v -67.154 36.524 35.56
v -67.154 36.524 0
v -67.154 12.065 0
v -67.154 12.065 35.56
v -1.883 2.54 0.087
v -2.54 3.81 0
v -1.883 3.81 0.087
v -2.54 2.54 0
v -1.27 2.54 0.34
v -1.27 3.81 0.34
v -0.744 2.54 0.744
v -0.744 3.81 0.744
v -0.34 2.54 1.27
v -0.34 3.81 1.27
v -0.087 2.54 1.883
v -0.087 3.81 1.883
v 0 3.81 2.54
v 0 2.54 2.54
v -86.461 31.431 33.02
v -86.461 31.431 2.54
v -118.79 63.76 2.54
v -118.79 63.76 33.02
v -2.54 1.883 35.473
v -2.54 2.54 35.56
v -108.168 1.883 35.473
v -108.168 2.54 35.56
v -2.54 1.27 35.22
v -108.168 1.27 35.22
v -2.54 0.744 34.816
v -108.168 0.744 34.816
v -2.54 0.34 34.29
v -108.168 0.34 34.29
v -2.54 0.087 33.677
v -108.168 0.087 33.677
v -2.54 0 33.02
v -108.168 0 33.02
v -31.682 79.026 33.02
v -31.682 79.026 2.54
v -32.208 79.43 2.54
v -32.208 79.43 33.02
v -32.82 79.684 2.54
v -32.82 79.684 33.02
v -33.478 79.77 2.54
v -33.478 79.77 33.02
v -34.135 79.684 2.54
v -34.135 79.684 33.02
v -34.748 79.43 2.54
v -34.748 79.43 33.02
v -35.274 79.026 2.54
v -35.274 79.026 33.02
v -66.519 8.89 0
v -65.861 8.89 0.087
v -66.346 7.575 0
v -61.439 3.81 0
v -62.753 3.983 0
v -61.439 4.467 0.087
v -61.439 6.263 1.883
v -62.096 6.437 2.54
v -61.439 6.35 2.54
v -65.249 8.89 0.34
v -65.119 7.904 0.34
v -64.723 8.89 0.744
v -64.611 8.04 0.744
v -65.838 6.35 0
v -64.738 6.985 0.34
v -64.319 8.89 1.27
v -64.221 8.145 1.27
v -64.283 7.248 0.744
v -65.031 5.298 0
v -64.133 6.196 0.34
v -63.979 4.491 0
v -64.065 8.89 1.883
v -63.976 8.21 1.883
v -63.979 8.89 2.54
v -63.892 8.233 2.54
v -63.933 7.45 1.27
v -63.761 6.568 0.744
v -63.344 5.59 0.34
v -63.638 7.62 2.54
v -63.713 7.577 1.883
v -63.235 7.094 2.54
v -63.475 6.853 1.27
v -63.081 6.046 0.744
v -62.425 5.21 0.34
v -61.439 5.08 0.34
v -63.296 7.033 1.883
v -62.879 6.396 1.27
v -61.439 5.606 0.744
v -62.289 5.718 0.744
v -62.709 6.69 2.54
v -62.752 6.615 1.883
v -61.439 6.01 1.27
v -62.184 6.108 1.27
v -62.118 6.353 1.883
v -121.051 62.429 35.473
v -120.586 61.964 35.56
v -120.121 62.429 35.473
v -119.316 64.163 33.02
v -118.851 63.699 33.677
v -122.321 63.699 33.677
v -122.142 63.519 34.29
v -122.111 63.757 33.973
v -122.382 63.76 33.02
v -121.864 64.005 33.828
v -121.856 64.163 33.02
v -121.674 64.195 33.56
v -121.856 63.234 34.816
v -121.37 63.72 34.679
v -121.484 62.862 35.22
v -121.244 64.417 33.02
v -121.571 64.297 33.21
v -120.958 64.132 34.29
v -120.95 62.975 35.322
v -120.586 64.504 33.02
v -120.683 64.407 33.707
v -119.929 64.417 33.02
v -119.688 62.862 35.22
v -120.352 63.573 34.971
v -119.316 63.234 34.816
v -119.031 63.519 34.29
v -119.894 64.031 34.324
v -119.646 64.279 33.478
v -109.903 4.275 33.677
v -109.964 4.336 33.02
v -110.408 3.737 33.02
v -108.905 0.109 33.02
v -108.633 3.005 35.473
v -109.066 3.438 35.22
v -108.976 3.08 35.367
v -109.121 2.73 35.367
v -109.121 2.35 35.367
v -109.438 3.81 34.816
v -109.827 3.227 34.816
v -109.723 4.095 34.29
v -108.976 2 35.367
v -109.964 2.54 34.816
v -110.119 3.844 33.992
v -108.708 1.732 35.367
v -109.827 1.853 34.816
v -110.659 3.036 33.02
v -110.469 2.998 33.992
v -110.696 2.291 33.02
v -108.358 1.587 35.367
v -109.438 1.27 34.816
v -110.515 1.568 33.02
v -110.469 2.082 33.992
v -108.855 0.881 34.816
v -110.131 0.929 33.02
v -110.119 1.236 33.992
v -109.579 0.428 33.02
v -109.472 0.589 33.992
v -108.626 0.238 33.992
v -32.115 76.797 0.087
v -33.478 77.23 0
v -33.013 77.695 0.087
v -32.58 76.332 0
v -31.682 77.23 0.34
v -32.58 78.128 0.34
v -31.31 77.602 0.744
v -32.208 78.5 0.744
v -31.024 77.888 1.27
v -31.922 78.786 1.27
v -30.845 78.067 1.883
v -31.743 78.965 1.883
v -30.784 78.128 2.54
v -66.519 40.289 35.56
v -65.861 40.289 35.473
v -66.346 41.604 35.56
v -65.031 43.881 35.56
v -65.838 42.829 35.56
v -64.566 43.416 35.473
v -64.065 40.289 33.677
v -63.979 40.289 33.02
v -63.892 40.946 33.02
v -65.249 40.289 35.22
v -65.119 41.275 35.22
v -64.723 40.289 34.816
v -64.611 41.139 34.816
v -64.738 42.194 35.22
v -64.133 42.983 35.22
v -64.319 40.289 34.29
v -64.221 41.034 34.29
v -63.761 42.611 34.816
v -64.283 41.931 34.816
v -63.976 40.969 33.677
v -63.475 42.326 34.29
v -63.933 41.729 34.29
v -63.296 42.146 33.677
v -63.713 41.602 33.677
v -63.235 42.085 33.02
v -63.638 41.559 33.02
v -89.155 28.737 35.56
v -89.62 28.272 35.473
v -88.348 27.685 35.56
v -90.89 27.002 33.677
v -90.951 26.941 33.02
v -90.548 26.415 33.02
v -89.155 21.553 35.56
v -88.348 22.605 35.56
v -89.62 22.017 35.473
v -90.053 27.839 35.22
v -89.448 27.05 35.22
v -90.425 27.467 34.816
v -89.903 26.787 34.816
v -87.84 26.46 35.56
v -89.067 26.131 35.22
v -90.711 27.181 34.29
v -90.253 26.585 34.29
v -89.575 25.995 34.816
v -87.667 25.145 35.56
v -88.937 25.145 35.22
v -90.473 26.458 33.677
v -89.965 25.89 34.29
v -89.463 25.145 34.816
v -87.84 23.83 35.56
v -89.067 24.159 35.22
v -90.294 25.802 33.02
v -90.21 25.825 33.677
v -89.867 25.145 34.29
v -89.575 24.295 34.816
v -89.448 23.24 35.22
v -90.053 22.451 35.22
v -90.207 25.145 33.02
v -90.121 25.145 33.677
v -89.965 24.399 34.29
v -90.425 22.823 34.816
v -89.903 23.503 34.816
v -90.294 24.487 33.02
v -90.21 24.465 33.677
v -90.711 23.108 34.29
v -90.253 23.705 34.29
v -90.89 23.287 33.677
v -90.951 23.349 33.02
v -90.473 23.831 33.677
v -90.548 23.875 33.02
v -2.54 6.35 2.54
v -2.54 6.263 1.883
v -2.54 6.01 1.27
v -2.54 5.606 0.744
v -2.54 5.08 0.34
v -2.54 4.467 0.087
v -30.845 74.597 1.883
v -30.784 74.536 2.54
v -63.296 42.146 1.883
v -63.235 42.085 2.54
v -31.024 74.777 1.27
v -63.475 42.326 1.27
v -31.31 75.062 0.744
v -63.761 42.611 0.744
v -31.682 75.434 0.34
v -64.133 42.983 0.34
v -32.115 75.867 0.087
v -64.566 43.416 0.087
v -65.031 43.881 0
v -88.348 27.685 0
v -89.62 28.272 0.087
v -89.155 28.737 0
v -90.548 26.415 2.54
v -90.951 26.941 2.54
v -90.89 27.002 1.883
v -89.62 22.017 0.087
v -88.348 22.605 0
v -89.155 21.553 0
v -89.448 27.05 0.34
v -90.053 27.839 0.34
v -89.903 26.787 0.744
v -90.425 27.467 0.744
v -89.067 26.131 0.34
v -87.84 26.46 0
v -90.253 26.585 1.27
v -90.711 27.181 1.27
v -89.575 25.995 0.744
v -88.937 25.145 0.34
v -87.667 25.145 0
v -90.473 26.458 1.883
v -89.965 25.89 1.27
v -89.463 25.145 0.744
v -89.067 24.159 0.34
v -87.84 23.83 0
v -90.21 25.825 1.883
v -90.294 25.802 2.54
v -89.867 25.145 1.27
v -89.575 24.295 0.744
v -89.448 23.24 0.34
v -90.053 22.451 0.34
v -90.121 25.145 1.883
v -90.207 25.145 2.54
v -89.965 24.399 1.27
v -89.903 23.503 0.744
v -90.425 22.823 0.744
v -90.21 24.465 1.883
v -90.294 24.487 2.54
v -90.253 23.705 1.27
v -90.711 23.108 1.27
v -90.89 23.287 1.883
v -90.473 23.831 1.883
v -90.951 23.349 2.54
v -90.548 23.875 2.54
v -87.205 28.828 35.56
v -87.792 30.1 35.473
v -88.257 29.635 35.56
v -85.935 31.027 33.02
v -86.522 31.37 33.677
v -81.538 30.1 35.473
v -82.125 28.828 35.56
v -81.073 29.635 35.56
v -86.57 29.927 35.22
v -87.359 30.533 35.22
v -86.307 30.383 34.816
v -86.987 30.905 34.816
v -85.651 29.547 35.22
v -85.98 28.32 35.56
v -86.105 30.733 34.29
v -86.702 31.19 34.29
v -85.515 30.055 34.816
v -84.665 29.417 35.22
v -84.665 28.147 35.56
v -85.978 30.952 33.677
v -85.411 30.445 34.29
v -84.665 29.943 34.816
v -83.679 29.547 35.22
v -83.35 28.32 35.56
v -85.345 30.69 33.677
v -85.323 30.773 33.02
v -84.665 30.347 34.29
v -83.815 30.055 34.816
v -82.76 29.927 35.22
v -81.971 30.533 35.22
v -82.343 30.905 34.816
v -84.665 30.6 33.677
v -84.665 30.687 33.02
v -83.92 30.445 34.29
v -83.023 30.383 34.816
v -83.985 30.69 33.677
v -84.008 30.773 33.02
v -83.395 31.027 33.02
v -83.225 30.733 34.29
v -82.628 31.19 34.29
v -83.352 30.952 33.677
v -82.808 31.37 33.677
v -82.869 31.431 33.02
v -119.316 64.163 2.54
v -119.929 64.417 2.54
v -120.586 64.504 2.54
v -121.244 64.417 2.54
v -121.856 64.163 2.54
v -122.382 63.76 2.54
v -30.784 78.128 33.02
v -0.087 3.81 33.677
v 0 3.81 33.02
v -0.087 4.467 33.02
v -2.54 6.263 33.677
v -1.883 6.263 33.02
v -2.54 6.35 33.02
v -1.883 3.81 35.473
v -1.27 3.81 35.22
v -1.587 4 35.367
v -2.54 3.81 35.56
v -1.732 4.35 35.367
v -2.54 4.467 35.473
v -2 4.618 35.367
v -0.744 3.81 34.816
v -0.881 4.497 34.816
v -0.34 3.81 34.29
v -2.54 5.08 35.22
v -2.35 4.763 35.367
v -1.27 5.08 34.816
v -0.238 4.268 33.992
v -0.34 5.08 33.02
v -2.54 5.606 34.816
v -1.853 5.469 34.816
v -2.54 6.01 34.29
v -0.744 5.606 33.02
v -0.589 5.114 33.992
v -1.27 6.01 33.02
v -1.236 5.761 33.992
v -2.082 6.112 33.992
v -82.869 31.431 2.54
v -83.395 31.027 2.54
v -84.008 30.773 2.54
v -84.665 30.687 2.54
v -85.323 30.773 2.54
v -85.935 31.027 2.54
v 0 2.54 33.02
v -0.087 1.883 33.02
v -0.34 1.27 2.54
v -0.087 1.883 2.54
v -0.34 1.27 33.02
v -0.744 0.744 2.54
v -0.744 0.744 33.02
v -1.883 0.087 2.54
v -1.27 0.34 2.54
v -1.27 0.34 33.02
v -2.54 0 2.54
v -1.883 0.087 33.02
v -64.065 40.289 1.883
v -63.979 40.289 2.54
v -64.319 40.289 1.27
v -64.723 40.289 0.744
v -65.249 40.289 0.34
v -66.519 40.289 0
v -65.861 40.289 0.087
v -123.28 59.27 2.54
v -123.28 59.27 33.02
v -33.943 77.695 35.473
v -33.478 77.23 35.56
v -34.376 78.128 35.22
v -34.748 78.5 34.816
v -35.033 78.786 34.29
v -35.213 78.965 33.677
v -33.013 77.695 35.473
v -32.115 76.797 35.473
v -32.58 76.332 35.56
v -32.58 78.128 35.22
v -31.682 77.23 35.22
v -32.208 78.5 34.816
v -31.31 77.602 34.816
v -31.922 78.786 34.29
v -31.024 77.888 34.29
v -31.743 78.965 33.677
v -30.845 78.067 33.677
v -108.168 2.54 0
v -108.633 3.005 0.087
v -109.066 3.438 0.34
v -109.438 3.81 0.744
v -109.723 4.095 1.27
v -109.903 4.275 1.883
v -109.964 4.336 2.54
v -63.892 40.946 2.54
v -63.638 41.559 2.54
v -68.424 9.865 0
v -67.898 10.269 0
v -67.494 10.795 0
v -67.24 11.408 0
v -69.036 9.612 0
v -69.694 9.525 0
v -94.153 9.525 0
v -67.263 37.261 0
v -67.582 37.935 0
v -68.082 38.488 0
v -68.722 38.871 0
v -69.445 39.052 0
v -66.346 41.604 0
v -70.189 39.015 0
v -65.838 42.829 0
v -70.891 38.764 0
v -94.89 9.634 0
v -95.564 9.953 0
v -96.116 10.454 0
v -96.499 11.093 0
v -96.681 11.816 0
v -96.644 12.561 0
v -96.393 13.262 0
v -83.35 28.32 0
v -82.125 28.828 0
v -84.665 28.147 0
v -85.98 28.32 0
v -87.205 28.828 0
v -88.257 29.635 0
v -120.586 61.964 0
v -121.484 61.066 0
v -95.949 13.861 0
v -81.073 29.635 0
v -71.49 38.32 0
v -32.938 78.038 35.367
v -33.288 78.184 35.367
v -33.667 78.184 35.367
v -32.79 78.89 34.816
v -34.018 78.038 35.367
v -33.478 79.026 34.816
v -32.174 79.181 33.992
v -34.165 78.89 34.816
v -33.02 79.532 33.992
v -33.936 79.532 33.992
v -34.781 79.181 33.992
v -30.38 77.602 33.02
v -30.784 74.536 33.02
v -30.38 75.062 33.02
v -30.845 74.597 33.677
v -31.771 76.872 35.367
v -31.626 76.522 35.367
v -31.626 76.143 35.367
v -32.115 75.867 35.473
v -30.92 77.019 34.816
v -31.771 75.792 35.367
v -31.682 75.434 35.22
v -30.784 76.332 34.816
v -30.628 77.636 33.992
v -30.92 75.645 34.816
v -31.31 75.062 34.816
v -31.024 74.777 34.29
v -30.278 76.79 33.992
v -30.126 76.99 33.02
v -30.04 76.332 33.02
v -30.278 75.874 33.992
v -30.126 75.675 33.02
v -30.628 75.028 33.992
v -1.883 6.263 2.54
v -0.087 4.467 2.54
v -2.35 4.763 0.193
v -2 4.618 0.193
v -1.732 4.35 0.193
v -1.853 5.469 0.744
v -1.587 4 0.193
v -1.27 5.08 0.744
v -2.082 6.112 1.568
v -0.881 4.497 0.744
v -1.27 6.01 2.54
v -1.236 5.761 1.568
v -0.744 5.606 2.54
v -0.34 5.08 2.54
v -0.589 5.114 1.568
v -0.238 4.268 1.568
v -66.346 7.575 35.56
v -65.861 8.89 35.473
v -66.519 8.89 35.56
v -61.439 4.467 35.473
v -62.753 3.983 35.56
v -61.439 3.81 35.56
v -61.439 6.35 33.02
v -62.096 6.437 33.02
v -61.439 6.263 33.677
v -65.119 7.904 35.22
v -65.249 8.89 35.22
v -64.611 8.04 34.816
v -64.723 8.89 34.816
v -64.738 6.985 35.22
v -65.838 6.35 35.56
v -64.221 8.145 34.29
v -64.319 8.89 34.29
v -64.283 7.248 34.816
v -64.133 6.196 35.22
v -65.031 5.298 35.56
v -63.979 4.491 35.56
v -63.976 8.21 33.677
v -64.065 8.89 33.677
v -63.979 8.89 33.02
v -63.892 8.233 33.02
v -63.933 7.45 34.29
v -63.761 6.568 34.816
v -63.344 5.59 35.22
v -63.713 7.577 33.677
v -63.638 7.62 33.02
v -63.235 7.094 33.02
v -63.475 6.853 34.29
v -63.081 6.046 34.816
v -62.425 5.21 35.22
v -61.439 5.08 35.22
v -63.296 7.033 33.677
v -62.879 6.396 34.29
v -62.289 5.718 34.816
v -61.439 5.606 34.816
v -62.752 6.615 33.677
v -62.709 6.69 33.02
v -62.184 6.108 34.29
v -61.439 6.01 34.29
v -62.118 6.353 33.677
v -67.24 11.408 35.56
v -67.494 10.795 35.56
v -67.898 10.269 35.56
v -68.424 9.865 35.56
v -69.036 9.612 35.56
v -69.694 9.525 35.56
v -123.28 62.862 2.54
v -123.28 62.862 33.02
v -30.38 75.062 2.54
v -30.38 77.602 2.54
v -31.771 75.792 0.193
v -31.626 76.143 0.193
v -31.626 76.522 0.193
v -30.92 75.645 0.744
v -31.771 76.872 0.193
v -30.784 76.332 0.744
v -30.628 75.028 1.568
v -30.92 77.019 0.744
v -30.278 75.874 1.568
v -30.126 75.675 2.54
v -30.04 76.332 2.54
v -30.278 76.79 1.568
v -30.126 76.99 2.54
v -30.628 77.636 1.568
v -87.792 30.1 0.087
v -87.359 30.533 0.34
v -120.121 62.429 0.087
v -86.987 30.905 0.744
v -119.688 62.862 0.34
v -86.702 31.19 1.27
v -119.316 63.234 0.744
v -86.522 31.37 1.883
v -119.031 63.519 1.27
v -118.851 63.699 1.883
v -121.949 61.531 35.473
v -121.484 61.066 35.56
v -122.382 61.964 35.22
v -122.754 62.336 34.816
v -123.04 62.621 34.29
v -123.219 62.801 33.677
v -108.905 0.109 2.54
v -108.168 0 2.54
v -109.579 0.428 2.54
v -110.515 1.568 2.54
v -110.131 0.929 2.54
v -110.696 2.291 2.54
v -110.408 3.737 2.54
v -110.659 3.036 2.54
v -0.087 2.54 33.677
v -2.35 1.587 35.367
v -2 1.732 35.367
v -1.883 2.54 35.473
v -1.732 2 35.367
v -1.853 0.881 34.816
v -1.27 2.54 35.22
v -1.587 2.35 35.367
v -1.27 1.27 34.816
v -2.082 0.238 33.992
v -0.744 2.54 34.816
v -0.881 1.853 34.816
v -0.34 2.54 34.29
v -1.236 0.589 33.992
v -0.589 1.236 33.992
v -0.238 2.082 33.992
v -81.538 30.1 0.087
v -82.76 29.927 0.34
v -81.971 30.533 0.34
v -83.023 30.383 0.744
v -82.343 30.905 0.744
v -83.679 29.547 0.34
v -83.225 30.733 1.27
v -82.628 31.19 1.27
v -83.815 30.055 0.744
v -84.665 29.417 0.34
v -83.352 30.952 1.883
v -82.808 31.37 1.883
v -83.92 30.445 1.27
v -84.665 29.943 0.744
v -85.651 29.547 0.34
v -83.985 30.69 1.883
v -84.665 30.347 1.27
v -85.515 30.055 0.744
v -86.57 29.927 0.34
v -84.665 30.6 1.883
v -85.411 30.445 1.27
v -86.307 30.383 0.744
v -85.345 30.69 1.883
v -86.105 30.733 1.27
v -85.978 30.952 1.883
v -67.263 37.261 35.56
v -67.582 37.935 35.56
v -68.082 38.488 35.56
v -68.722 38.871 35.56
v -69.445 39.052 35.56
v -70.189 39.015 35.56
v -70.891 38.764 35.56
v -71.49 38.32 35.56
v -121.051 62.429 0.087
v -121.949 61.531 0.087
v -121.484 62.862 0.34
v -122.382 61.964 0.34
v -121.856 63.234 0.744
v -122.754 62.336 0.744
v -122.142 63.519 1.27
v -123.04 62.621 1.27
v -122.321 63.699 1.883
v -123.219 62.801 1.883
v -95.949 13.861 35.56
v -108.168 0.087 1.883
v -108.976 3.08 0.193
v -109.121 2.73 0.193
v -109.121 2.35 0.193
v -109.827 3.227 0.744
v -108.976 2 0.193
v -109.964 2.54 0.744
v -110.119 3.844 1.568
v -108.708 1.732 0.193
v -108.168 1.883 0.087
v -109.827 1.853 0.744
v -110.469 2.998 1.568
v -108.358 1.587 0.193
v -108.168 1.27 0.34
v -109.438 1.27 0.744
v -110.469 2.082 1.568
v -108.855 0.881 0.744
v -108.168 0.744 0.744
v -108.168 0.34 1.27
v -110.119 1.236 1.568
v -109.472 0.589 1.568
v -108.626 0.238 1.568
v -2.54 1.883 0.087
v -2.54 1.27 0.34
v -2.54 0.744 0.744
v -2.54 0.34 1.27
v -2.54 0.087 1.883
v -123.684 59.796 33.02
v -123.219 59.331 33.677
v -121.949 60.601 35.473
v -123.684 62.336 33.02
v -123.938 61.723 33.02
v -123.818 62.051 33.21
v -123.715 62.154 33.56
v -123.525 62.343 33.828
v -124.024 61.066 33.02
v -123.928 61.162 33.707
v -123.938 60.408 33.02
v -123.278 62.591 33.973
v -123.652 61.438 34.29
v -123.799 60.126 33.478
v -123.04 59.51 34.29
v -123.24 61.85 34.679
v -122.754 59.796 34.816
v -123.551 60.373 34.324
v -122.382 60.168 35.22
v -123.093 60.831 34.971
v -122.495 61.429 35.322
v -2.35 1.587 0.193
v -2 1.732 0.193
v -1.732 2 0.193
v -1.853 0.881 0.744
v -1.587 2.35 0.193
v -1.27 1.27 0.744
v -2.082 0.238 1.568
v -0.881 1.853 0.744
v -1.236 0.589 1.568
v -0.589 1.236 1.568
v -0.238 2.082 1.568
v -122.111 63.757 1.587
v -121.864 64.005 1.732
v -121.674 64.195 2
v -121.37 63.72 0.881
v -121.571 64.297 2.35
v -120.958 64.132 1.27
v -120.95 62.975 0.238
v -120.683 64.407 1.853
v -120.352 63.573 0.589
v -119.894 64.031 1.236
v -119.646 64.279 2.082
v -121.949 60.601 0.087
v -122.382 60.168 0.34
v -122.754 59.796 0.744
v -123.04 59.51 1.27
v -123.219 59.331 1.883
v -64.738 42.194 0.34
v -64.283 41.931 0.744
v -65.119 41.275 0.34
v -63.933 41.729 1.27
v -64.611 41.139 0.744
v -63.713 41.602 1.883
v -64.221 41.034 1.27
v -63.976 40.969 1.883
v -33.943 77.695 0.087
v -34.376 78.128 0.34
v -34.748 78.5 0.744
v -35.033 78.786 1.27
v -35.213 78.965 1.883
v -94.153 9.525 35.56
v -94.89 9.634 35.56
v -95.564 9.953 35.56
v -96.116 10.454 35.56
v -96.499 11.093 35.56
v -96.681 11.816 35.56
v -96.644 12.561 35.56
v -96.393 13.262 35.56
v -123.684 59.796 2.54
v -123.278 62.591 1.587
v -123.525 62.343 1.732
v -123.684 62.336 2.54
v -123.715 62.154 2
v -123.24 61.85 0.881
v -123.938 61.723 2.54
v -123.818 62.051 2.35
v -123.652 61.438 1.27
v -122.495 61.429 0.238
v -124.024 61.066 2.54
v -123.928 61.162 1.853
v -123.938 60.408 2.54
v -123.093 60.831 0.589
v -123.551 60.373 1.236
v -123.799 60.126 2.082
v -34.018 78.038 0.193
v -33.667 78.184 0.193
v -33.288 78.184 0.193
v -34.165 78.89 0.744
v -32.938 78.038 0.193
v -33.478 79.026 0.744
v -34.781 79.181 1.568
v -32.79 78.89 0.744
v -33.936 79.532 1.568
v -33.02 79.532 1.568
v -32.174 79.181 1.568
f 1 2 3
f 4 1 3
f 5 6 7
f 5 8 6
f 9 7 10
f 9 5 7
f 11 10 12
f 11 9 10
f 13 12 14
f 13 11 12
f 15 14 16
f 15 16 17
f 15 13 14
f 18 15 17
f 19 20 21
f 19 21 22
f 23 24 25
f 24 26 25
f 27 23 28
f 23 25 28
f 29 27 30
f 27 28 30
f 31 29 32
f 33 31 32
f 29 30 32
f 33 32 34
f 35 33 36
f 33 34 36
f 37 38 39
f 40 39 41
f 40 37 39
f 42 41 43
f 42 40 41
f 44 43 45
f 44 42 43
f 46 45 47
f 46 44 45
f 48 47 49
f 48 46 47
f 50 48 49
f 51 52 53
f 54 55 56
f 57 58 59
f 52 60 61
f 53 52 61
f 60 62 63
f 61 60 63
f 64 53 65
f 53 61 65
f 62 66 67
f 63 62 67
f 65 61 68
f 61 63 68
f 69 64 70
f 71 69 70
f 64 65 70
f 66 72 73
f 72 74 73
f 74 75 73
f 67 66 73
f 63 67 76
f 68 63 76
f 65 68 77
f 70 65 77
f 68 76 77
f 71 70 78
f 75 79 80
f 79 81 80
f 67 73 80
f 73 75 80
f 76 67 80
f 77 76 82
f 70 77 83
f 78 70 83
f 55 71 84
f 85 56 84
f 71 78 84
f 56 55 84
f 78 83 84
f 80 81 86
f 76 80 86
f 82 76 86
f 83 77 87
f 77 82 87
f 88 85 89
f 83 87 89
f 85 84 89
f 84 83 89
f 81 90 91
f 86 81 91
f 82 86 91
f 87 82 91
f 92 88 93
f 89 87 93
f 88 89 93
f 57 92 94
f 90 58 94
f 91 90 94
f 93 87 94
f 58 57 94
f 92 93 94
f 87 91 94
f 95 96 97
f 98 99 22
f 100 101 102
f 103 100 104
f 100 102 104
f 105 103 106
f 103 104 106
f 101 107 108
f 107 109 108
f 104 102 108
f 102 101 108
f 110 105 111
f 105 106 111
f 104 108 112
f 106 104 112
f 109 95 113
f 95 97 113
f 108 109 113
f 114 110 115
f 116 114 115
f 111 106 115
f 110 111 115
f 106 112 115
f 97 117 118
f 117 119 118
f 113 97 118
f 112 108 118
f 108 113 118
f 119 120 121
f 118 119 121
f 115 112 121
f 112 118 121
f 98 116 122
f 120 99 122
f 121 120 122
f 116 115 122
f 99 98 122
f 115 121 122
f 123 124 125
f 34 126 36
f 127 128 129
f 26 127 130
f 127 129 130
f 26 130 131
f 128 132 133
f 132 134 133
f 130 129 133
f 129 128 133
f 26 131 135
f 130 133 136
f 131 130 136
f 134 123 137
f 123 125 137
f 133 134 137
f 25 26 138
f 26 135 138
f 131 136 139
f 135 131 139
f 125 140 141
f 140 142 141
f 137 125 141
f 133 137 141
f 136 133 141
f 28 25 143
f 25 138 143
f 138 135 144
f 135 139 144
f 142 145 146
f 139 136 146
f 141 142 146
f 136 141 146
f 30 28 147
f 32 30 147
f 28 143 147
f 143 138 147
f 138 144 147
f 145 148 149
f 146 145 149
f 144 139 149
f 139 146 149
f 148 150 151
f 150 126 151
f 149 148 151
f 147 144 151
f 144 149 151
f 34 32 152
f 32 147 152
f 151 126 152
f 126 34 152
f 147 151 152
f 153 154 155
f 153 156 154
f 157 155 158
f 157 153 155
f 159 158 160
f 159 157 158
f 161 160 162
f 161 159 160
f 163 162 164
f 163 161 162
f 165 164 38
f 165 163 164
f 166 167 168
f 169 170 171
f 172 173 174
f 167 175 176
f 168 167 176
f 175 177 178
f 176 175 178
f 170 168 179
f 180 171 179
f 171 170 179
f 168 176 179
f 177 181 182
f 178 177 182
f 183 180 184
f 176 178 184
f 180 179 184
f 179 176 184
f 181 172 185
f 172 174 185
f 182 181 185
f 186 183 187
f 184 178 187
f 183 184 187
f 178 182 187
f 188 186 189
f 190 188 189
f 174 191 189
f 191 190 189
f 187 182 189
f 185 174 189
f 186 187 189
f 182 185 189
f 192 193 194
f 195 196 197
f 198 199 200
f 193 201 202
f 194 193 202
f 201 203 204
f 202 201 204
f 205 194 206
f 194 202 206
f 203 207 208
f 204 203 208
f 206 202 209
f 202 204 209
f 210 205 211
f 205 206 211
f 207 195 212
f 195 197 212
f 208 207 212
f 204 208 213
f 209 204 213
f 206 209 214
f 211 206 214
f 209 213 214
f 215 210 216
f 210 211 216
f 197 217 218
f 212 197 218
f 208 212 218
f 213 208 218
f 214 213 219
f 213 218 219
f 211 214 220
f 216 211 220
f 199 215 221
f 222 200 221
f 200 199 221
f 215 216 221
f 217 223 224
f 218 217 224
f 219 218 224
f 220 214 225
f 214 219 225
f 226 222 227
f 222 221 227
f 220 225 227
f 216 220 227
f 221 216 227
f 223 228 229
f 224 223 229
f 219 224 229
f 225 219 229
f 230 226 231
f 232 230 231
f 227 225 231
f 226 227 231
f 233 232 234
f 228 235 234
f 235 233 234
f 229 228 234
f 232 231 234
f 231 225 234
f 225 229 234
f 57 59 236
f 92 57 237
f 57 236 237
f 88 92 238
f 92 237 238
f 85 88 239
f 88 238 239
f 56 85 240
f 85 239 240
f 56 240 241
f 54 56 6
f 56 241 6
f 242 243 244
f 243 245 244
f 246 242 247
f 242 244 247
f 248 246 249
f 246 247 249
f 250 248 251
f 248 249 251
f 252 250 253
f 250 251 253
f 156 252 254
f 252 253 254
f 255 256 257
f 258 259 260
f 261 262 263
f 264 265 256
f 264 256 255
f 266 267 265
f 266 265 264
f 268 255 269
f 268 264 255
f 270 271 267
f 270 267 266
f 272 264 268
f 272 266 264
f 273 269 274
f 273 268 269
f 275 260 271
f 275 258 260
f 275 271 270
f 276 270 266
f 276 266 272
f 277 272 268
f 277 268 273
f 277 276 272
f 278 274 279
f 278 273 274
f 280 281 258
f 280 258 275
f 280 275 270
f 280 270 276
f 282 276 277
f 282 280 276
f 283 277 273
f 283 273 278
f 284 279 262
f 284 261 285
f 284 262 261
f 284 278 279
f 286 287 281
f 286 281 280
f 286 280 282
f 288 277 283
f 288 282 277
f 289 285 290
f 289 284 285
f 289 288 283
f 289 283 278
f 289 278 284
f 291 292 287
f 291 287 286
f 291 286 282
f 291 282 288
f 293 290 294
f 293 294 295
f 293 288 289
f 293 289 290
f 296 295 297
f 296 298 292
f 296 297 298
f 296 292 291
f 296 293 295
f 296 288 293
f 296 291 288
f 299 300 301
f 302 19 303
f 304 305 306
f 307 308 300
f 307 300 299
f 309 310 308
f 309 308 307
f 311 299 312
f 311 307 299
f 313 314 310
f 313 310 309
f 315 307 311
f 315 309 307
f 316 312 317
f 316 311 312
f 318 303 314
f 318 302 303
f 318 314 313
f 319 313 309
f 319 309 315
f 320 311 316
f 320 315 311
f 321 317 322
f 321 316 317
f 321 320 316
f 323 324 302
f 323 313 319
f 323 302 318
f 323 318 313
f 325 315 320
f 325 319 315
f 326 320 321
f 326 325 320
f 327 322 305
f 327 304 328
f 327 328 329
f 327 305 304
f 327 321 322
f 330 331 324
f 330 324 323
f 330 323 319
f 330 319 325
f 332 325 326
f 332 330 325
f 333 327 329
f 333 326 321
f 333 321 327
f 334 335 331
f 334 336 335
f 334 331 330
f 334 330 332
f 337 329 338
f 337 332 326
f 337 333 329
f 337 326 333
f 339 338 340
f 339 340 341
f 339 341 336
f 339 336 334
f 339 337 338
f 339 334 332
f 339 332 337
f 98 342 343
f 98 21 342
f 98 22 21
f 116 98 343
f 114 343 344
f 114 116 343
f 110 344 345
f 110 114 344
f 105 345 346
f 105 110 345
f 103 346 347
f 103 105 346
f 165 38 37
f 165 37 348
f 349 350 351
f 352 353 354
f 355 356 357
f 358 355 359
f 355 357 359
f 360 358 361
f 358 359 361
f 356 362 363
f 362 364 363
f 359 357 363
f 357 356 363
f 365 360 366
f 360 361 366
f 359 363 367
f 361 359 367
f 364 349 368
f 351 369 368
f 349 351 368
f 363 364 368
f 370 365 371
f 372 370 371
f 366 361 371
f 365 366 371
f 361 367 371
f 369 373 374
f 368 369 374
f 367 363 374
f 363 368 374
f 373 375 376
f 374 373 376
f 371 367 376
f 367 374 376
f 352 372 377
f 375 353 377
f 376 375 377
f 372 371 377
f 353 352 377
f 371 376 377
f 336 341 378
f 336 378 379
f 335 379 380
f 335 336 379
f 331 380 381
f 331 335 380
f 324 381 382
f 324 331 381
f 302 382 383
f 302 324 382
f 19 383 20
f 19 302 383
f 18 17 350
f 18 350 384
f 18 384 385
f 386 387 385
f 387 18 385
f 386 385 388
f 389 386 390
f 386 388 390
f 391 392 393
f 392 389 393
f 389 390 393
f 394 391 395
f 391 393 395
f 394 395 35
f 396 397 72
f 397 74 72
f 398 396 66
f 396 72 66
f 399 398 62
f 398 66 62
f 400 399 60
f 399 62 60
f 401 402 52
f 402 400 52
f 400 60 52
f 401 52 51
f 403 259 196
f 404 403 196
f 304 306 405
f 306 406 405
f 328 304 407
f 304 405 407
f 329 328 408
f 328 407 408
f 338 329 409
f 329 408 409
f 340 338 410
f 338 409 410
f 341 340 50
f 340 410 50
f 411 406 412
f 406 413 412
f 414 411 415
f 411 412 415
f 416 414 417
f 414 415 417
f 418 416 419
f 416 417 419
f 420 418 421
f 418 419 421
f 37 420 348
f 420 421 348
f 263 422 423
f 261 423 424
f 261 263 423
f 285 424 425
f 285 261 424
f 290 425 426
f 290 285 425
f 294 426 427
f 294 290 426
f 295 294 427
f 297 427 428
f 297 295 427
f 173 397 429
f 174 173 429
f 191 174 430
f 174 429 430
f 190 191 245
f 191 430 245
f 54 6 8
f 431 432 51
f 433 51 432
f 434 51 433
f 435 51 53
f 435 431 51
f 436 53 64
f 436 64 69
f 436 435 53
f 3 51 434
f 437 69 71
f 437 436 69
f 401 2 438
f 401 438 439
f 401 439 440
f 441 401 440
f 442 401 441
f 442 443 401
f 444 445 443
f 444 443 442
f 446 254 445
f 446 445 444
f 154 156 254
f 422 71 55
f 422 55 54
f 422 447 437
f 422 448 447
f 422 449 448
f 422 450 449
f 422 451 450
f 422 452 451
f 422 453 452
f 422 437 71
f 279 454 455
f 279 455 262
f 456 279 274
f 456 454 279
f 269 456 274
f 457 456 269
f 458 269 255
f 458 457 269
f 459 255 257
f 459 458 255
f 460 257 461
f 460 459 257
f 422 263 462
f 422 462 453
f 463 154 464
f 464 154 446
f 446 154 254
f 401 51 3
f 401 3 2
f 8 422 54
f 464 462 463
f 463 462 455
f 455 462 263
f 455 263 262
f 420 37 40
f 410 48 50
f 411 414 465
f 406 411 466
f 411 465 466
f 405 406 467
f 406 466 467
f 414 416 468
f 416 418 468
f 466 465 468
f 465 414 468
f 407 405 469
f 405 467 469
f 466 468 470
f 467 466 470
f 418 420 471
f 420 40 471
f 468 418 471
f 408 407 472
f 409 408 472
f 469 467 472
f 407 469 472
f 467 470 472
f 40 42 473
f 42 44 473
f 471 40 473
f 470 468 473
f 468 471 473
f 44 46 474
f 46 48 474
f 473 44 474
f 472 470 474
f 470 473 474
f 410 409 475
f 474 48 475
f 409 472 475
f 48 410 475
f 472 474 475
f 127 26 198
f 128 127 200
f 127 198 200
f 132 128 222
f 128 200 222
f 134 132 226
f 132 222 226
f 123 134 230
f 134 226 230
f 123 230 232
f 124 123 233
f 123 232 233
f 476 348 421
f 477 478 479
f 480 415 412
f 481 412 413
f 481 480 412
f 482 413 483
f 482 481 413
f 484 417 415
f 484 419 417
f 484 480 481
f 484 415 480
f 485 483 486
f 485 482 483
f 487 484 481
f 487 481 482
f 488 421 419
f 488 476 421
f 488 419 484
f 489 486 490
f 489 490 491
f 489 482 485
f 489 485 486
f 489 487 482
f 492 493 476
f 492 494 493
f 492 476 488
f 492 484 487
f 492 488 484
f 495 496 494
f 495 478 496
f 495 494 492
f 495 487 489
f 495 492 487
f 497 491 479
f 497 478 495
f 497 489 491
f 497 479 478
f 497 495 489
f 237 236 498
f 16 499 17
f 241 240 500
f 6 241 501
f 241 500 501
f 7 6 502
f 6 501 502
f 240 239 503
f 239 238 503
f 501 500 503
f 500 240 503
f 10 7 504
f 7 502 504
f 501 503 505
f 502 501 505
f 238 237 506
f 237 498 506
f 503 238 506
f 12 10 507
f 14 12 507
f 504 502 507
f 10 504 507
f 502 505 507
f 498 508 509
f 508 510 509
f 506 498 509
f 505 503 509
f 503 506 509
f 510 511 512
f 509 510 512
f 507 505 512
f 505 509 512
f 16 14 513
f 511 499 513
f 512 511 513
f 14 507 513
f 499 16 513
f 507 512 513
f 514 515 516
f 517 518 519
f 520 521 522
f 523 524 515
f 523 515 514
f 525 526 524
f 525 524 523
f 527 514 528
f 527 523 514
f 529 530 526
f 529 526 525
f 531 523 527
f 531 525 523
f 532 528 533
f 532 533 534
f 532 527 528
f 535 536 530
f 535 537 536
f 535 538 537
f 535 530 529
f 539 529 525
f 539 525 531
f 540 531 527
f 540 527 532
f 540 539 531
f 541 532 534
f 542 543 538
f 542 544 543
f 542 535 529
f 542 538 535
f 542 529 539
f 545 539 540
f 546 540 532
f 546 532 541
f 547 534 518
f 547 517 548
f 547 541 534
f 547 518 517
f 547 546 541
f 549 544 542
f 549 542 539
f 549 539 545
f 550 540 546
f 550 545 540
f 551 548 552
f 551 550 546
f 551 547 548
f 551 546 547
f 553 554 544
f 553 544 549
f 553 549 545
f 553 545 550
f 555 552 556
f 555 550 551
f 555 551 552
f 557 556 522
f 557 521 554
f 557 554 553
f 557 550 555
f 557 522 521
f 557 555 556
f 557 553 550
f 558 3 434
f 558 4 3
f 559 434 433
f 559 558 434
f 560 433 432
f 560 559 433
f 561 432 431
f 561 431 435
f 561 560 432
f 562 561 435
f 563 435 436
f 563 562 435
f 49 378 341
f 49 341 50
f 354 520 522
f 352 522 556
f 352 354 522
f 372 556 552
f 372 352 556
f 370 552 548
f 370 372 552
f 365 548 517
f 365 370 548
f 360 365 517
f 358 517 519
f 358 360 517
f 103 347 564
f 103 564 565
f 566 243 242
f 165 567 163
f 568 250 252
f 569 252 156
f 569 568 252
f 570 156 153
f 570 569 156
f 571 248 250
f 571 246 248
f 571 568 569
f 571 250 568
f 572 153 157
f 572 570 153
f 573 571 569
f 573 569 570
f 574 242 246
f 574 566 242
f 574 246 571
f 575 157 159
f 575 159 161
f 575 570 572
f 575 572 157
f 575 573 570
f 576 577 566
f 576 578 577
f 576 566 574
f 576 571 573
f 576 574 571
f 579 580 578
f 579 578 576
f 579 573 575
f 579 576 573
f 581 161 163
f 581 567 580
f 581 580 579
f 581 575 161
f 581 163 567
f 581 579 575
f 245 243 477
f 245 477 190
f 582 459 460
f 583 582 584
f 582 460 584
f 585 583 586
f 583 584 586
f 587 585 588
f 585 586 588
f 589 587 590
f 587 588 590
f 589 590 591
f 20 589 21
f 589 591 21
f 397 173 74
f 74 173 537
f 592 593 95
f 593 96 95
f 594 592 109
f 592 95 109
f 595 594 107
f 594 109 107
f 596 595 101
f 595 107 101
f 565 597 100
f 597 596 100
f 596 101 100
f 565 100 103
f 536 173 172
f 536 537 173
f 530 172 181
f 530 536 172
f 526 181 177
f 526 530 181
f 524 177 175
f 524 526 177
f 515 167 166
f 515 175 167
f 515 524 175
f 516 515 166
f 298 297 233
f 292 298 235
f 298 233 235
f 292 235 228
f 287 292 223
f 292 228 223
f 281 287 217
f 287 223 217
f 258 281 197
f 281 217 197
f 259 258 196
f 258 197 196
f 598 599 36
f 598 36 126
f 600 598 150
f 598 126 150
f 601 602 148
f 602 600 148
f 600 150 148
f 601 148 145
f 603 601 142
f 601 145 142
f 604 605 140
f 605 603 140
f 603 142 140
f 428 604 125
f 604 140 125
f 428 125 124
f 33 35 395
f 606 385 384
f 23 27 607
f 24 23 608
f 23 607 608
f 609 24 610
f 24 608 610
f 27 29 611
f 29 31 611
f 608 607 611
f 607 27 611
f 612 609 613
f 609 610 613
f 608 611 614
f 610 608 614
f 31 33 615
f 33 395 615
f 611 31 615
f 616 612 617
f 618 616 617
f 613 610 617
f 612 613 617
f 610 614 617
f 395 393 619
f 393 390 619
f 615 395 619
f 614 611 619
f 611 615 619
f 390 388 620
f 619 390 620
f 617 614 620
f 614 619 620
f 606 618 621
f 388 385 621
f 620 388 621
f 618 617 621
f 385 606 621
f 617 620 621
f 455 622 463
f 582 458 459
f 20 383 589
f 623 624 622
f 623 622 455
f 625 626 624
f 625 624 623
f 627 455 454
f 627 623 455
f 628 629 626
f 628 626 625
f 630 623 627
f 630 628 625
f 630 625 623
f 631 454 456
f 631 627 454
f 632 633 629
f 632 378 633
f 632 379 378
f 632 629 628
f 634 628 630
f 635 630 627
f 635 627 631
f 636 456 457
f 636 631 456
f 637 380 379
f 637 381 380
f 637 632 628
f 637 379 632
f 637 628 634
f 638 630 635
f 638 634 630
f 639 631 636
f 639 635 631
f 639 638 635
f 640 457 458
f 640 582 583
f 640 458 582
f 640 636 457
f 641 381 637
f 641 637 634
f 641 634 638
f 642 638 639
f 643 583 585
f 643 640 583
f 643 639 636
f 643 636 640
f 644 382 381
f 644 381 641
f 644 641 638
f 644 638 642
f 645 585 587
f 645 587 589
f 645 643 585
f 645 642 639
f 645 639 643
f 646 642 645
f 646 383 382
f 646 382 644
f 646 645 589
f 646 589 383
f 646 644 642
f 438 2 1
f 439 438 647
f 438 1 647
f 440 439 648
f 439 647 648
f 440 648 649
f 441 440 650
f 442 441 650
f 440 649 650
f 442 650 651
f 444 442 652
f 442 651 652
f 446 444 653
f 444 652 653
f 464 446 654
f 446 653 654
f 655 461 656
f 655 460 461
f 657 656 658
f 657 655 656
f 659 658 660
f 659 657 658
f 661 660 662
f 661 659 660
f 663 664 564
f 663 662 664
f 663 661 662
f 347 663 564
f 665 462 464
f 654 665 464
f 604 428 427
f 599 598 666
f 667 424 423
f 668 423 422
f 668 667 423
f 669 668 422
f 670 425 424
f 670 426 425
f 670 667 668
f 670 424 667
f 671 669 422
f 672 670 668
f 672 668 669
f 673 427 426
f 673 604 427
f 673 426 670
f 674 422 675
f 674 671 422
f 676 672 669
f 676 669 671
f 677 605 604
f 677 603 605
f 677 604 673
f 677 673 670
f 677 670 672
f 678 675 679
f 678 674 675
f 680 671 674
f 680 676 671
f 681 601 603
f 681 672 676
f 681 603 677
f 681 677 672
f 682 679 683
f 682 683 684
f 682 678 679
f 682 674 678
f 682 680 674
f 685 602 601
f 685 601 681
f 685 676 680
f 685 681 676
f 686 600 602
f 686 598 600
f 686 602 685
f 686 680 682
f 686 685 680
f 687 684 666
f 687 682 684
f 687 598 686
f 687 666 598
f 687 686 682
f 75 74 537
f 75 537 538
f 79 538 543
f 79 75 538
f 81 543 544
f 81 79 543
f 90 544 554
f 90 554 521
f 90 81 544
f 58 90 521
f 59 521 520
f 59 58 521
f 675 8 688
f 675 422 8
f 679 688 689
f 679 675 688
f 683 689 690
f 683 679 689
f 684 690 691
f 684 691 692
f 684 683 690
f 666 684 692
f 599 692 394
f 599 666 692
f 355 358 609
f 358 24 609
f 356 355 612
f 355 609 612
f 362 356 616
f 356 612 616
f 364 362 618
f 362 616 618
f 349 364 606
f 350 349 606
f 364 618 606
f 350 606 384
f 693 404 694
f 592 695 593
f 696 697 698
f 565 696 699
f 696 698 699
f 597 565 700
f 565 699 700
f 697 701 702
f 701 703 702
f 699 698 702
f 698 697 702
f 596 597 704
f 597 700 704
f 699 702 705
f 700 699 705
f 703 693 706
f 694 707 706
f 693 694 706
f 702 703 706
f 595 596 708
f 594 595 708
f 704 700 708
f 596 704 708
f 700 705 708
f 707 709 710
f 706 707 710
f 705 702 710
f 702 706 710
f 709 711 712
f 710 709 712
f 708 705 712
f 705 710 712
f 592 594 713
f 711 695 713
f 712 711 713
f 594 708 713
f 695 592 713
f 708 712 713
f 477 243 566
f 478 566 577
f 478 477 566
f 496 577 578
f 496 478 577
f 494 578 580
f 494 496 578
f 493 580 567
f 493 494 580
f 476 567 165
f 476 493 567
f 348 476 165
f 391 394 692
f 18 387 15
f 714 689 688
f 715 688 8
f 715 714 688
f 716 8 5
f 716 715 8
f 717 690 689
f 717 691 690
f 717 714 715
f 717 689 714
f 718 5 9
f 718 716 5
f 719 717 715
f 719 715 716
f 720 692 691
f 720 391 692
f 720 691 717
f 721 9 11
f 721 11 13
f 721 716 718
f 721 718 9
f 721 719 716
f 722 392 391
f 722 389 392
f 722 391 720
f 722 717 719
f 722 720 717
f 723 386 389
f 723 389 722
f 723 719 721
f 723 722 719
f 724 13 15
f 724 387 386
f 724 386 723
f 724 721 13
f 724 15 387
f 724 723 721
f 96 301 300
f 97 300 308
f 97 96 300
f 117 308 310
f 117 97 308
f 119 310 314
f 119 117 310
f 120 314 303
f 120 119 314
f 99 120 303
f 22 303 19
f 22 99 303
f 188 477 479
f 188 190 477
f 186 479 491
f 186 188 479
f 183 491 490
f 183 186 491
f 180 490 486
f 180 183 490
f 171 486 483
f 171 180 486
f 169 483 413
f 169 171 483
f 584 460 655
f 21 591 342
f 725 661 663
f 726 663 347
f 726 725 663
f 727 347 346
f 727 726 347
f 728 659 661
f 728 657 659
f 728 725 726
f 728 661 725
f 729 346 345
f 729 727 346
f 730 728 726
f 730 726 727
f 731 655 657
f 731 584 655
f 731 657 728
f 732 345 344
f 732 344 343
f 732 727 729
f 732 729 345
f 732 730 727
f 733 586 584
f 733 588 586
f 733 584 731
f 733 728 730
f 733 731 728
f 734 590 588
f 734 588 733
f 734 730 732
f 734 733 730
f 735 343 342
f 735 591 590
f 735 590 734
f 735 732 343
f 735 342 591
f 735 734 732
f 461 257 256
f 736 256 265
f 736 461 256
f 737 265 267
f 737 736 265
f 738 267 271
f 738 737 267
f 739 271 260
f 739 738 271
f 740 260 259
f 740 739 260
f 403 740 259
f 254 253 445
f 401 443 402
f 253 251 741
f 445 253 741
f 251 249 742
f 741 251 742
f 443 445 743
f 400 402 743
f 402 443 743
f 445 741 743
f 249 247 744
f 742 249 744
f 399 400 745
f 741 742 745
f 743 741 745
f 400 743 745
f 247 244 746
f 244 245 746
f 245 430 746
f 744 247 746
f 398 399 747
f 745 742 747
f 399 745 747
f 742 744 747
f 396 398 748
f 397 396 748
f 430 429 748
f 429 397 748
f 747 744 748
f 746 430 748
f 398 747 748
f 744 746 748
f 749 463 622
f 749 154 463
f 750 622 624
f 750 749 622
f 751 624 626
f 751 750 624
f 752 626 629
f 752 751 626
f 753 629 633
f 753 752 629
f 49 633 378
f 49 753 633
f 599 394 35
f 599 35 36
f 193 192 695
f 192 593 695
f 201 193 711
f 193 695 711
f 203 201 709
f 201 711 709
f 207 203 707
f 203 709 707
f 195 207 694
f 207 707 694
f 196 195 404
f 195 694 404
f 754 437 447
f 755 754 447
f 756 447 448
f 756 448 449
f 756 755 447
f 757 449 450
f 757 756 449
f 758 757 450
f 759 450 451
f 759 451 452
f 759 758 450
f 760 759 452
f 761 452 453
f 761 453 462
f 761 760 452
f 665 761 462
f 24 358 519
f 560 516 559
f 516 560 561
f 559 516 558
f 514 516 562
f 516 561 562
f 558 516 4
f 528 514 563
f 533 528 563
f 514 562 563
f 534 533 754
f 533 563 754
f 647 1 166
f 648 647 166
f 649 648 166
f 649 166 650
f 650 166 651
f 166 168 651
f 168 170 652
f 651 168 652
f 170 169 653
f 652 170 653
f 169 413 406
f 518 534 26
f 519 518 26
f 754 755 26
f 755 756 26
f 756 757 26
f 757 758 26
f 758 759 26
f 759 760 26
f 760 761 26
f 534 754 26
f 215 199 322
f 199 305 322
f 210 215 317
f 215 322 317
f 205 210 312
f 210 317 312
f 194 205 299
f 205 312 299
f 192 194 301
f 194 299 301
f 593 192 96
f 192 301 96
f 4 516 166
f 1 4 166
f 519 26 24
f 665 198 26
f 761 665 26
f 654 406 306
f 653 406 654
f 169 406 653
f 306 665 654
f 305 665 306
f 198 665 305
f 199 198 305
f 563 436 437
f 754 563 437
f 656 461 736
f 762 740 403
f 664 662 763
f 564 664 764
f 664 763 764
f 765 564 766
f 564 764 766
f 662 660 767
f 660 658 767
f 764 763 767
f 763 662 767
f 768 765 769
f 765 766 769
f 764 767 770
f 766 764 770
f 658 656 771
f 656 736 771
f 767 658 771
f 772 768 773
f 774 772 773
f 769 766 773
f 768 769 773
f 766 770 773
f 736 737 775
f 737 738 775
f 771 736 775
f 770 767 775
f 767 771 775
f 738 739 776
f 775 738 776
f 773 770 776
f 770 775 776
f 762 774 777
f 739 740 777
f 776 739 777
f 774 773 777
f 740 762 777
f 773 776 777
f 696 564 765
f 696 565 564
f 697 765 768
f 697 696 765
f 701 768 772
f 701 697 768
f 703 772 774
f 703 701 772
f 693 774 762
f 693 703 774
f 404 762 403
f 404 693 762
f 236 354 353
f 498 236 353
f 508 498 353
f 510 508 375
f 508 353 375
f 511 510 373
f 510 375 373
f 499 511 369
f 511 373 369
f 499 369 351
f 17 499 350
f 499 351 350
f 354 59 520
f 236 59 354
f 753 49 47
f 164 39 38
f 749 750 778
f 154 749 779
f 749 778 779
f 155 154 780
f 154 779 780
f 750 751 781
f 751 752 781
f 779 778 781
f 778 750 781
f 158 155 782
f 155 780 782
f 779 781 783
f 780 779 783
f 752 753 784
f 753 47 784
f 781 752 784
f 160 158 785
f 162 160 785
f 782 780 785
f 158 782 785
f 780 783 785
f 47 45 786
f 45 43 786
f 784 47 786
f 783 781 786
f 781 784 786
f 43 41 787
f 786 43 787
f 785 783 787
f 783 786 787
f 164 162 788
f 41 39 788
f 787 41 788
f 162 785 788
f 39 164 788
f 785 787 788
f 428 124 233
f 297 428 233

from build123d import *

# Parameters (mm, degrees)
BOSS_EXTRUDE1_DEPTH = 35.56
SKETCH3_W           = 35.56
SKETCH3_H           = 6.35
BOSS_EXTRUDE2_DEPTH = 50.8
BOSS_EXTRUDE4_DEPTH = 35.56
CUT_EXTRUDE1_DEPTH  = 45.72
FILLET5_R           = 2.54


with BuildPart() as part:
    # Sketch2 → Boss-Extrude1 (new body)
    with BuildSketch(Plane.XY):
        Polygon((0, 0), (-114.3, 0), (-33.47769491, 80.82230509), (-28.98756685, 76.332177029), (-98.969743879, 6.35), (0, 6.35), align=None)
    extrude(amount=BOSS_EXTRUDE1_DEPTH)

    # Sketch3 → Boss-Extrude2 (add)
    with BuildSketch(Plane(origin=(-57.15, 57.15, 0), x_dir=(0, 0, 1), z_dir=(-0.707106781186544, 0.7071067811865511, 0))):
        with Locations((17.78, -42.08730509)):
            Rectangle(SKETCH3_W, SKETCH3_H)
    extrude(amount=BOSS_EXTRUDE2_DEPTH)

    # Sketch5 → Boss-Extrude4 (add)
    with BuildSketch(Plane.XY.offset(35.56)):
        Polygon((-98.969743879, 6.35), (-63.978655364, 41.341088515), (-63.978655364, 6.35), align=None)
    extrude(amount=-BOSS_EXTRUDE4_DEPTH)

    # Sketch6 → Cut-Extrude1 (cut)
    with BuildSketch(Plane(origin=(0, 0, 0), x_dir=(-1, 0, 0), z_dir=(0, 0, -1))):
        Polygon((67.153655364, 42.656216575), (67.153655364, 9.525), (100.284871939, 9.525), align=None)
    extrude(amount=-CUT_EXTRUDE1_DEPTH, mode=Mode.SUBTRACT)

    # Fillet5
    fillet5_edges = [part.edges().sort_by_distance(p)[0] for p in [
        (0, 0, 17.78),
        (-114.3, 0, 17.78),
        (-33.47769491, 80.82230509, 17.78),
        (-28.98756685, 76.332177029, 17.78),
        (0, 6.35, 17.78),
        (-31.23263088, 78.577241059, 35.56),
        (-101.727641431, 12.572358569, 0),
        (-101.727641431, 12.572358569, 35.56),
        (-59.071424855, 55.228575145, 35.56),
        (-102.625667043, 47.595357442, 0),
        (-89.155282861, 25.144717139, 17.78),
        (-107.115795103, 43.105229381, 0),
        (-107.115795103, 43.105229381, 35.56),
        (-84.6651548, 29.6348452, 17.78),
        (-102.625667043, 47.595357442, 35.56),
        (-122.831243315, 63.310805654, 0),
        (-125.076307345, 61.065741623, 17.78),
        (-122.831243315, 63.310805654, 35.56),
        (-120.586179285, 65.555869684, 17.78),
        (-57.15, 0, 35.56),
        (-46.483111107, 58.836632772, 0),
        (-46.483111107, 58.836632772, 35.56),
        (-63.978655364, 6.35, 17.78),
        (-63.978655364, 23.845544257, 0),
        (-63.978655364, 41.341088515, 17.78),
        (-63.978655364, 23.845544257, 35.56),
        (-67.153655364, 42.656216575, 17.78),
        (-100.284871939, 9.525, 17.78),
        (-67.153655364, 9.525, 17.78),
        (0, 3.175, 35.56),
        (-57.15, 0, 0),
        (-59.071424855, 55.228575145, 0),
        (-31.23263088, 78.577241059, 0),
        (-31.989327682, 6.35, 0),
        (0, 3.175, 0),
        (-31.989327682, 6.35, 35.56),
    ]]
    fillet(fillet5_edges, radius=FILLET5_R)


solid = part.part
